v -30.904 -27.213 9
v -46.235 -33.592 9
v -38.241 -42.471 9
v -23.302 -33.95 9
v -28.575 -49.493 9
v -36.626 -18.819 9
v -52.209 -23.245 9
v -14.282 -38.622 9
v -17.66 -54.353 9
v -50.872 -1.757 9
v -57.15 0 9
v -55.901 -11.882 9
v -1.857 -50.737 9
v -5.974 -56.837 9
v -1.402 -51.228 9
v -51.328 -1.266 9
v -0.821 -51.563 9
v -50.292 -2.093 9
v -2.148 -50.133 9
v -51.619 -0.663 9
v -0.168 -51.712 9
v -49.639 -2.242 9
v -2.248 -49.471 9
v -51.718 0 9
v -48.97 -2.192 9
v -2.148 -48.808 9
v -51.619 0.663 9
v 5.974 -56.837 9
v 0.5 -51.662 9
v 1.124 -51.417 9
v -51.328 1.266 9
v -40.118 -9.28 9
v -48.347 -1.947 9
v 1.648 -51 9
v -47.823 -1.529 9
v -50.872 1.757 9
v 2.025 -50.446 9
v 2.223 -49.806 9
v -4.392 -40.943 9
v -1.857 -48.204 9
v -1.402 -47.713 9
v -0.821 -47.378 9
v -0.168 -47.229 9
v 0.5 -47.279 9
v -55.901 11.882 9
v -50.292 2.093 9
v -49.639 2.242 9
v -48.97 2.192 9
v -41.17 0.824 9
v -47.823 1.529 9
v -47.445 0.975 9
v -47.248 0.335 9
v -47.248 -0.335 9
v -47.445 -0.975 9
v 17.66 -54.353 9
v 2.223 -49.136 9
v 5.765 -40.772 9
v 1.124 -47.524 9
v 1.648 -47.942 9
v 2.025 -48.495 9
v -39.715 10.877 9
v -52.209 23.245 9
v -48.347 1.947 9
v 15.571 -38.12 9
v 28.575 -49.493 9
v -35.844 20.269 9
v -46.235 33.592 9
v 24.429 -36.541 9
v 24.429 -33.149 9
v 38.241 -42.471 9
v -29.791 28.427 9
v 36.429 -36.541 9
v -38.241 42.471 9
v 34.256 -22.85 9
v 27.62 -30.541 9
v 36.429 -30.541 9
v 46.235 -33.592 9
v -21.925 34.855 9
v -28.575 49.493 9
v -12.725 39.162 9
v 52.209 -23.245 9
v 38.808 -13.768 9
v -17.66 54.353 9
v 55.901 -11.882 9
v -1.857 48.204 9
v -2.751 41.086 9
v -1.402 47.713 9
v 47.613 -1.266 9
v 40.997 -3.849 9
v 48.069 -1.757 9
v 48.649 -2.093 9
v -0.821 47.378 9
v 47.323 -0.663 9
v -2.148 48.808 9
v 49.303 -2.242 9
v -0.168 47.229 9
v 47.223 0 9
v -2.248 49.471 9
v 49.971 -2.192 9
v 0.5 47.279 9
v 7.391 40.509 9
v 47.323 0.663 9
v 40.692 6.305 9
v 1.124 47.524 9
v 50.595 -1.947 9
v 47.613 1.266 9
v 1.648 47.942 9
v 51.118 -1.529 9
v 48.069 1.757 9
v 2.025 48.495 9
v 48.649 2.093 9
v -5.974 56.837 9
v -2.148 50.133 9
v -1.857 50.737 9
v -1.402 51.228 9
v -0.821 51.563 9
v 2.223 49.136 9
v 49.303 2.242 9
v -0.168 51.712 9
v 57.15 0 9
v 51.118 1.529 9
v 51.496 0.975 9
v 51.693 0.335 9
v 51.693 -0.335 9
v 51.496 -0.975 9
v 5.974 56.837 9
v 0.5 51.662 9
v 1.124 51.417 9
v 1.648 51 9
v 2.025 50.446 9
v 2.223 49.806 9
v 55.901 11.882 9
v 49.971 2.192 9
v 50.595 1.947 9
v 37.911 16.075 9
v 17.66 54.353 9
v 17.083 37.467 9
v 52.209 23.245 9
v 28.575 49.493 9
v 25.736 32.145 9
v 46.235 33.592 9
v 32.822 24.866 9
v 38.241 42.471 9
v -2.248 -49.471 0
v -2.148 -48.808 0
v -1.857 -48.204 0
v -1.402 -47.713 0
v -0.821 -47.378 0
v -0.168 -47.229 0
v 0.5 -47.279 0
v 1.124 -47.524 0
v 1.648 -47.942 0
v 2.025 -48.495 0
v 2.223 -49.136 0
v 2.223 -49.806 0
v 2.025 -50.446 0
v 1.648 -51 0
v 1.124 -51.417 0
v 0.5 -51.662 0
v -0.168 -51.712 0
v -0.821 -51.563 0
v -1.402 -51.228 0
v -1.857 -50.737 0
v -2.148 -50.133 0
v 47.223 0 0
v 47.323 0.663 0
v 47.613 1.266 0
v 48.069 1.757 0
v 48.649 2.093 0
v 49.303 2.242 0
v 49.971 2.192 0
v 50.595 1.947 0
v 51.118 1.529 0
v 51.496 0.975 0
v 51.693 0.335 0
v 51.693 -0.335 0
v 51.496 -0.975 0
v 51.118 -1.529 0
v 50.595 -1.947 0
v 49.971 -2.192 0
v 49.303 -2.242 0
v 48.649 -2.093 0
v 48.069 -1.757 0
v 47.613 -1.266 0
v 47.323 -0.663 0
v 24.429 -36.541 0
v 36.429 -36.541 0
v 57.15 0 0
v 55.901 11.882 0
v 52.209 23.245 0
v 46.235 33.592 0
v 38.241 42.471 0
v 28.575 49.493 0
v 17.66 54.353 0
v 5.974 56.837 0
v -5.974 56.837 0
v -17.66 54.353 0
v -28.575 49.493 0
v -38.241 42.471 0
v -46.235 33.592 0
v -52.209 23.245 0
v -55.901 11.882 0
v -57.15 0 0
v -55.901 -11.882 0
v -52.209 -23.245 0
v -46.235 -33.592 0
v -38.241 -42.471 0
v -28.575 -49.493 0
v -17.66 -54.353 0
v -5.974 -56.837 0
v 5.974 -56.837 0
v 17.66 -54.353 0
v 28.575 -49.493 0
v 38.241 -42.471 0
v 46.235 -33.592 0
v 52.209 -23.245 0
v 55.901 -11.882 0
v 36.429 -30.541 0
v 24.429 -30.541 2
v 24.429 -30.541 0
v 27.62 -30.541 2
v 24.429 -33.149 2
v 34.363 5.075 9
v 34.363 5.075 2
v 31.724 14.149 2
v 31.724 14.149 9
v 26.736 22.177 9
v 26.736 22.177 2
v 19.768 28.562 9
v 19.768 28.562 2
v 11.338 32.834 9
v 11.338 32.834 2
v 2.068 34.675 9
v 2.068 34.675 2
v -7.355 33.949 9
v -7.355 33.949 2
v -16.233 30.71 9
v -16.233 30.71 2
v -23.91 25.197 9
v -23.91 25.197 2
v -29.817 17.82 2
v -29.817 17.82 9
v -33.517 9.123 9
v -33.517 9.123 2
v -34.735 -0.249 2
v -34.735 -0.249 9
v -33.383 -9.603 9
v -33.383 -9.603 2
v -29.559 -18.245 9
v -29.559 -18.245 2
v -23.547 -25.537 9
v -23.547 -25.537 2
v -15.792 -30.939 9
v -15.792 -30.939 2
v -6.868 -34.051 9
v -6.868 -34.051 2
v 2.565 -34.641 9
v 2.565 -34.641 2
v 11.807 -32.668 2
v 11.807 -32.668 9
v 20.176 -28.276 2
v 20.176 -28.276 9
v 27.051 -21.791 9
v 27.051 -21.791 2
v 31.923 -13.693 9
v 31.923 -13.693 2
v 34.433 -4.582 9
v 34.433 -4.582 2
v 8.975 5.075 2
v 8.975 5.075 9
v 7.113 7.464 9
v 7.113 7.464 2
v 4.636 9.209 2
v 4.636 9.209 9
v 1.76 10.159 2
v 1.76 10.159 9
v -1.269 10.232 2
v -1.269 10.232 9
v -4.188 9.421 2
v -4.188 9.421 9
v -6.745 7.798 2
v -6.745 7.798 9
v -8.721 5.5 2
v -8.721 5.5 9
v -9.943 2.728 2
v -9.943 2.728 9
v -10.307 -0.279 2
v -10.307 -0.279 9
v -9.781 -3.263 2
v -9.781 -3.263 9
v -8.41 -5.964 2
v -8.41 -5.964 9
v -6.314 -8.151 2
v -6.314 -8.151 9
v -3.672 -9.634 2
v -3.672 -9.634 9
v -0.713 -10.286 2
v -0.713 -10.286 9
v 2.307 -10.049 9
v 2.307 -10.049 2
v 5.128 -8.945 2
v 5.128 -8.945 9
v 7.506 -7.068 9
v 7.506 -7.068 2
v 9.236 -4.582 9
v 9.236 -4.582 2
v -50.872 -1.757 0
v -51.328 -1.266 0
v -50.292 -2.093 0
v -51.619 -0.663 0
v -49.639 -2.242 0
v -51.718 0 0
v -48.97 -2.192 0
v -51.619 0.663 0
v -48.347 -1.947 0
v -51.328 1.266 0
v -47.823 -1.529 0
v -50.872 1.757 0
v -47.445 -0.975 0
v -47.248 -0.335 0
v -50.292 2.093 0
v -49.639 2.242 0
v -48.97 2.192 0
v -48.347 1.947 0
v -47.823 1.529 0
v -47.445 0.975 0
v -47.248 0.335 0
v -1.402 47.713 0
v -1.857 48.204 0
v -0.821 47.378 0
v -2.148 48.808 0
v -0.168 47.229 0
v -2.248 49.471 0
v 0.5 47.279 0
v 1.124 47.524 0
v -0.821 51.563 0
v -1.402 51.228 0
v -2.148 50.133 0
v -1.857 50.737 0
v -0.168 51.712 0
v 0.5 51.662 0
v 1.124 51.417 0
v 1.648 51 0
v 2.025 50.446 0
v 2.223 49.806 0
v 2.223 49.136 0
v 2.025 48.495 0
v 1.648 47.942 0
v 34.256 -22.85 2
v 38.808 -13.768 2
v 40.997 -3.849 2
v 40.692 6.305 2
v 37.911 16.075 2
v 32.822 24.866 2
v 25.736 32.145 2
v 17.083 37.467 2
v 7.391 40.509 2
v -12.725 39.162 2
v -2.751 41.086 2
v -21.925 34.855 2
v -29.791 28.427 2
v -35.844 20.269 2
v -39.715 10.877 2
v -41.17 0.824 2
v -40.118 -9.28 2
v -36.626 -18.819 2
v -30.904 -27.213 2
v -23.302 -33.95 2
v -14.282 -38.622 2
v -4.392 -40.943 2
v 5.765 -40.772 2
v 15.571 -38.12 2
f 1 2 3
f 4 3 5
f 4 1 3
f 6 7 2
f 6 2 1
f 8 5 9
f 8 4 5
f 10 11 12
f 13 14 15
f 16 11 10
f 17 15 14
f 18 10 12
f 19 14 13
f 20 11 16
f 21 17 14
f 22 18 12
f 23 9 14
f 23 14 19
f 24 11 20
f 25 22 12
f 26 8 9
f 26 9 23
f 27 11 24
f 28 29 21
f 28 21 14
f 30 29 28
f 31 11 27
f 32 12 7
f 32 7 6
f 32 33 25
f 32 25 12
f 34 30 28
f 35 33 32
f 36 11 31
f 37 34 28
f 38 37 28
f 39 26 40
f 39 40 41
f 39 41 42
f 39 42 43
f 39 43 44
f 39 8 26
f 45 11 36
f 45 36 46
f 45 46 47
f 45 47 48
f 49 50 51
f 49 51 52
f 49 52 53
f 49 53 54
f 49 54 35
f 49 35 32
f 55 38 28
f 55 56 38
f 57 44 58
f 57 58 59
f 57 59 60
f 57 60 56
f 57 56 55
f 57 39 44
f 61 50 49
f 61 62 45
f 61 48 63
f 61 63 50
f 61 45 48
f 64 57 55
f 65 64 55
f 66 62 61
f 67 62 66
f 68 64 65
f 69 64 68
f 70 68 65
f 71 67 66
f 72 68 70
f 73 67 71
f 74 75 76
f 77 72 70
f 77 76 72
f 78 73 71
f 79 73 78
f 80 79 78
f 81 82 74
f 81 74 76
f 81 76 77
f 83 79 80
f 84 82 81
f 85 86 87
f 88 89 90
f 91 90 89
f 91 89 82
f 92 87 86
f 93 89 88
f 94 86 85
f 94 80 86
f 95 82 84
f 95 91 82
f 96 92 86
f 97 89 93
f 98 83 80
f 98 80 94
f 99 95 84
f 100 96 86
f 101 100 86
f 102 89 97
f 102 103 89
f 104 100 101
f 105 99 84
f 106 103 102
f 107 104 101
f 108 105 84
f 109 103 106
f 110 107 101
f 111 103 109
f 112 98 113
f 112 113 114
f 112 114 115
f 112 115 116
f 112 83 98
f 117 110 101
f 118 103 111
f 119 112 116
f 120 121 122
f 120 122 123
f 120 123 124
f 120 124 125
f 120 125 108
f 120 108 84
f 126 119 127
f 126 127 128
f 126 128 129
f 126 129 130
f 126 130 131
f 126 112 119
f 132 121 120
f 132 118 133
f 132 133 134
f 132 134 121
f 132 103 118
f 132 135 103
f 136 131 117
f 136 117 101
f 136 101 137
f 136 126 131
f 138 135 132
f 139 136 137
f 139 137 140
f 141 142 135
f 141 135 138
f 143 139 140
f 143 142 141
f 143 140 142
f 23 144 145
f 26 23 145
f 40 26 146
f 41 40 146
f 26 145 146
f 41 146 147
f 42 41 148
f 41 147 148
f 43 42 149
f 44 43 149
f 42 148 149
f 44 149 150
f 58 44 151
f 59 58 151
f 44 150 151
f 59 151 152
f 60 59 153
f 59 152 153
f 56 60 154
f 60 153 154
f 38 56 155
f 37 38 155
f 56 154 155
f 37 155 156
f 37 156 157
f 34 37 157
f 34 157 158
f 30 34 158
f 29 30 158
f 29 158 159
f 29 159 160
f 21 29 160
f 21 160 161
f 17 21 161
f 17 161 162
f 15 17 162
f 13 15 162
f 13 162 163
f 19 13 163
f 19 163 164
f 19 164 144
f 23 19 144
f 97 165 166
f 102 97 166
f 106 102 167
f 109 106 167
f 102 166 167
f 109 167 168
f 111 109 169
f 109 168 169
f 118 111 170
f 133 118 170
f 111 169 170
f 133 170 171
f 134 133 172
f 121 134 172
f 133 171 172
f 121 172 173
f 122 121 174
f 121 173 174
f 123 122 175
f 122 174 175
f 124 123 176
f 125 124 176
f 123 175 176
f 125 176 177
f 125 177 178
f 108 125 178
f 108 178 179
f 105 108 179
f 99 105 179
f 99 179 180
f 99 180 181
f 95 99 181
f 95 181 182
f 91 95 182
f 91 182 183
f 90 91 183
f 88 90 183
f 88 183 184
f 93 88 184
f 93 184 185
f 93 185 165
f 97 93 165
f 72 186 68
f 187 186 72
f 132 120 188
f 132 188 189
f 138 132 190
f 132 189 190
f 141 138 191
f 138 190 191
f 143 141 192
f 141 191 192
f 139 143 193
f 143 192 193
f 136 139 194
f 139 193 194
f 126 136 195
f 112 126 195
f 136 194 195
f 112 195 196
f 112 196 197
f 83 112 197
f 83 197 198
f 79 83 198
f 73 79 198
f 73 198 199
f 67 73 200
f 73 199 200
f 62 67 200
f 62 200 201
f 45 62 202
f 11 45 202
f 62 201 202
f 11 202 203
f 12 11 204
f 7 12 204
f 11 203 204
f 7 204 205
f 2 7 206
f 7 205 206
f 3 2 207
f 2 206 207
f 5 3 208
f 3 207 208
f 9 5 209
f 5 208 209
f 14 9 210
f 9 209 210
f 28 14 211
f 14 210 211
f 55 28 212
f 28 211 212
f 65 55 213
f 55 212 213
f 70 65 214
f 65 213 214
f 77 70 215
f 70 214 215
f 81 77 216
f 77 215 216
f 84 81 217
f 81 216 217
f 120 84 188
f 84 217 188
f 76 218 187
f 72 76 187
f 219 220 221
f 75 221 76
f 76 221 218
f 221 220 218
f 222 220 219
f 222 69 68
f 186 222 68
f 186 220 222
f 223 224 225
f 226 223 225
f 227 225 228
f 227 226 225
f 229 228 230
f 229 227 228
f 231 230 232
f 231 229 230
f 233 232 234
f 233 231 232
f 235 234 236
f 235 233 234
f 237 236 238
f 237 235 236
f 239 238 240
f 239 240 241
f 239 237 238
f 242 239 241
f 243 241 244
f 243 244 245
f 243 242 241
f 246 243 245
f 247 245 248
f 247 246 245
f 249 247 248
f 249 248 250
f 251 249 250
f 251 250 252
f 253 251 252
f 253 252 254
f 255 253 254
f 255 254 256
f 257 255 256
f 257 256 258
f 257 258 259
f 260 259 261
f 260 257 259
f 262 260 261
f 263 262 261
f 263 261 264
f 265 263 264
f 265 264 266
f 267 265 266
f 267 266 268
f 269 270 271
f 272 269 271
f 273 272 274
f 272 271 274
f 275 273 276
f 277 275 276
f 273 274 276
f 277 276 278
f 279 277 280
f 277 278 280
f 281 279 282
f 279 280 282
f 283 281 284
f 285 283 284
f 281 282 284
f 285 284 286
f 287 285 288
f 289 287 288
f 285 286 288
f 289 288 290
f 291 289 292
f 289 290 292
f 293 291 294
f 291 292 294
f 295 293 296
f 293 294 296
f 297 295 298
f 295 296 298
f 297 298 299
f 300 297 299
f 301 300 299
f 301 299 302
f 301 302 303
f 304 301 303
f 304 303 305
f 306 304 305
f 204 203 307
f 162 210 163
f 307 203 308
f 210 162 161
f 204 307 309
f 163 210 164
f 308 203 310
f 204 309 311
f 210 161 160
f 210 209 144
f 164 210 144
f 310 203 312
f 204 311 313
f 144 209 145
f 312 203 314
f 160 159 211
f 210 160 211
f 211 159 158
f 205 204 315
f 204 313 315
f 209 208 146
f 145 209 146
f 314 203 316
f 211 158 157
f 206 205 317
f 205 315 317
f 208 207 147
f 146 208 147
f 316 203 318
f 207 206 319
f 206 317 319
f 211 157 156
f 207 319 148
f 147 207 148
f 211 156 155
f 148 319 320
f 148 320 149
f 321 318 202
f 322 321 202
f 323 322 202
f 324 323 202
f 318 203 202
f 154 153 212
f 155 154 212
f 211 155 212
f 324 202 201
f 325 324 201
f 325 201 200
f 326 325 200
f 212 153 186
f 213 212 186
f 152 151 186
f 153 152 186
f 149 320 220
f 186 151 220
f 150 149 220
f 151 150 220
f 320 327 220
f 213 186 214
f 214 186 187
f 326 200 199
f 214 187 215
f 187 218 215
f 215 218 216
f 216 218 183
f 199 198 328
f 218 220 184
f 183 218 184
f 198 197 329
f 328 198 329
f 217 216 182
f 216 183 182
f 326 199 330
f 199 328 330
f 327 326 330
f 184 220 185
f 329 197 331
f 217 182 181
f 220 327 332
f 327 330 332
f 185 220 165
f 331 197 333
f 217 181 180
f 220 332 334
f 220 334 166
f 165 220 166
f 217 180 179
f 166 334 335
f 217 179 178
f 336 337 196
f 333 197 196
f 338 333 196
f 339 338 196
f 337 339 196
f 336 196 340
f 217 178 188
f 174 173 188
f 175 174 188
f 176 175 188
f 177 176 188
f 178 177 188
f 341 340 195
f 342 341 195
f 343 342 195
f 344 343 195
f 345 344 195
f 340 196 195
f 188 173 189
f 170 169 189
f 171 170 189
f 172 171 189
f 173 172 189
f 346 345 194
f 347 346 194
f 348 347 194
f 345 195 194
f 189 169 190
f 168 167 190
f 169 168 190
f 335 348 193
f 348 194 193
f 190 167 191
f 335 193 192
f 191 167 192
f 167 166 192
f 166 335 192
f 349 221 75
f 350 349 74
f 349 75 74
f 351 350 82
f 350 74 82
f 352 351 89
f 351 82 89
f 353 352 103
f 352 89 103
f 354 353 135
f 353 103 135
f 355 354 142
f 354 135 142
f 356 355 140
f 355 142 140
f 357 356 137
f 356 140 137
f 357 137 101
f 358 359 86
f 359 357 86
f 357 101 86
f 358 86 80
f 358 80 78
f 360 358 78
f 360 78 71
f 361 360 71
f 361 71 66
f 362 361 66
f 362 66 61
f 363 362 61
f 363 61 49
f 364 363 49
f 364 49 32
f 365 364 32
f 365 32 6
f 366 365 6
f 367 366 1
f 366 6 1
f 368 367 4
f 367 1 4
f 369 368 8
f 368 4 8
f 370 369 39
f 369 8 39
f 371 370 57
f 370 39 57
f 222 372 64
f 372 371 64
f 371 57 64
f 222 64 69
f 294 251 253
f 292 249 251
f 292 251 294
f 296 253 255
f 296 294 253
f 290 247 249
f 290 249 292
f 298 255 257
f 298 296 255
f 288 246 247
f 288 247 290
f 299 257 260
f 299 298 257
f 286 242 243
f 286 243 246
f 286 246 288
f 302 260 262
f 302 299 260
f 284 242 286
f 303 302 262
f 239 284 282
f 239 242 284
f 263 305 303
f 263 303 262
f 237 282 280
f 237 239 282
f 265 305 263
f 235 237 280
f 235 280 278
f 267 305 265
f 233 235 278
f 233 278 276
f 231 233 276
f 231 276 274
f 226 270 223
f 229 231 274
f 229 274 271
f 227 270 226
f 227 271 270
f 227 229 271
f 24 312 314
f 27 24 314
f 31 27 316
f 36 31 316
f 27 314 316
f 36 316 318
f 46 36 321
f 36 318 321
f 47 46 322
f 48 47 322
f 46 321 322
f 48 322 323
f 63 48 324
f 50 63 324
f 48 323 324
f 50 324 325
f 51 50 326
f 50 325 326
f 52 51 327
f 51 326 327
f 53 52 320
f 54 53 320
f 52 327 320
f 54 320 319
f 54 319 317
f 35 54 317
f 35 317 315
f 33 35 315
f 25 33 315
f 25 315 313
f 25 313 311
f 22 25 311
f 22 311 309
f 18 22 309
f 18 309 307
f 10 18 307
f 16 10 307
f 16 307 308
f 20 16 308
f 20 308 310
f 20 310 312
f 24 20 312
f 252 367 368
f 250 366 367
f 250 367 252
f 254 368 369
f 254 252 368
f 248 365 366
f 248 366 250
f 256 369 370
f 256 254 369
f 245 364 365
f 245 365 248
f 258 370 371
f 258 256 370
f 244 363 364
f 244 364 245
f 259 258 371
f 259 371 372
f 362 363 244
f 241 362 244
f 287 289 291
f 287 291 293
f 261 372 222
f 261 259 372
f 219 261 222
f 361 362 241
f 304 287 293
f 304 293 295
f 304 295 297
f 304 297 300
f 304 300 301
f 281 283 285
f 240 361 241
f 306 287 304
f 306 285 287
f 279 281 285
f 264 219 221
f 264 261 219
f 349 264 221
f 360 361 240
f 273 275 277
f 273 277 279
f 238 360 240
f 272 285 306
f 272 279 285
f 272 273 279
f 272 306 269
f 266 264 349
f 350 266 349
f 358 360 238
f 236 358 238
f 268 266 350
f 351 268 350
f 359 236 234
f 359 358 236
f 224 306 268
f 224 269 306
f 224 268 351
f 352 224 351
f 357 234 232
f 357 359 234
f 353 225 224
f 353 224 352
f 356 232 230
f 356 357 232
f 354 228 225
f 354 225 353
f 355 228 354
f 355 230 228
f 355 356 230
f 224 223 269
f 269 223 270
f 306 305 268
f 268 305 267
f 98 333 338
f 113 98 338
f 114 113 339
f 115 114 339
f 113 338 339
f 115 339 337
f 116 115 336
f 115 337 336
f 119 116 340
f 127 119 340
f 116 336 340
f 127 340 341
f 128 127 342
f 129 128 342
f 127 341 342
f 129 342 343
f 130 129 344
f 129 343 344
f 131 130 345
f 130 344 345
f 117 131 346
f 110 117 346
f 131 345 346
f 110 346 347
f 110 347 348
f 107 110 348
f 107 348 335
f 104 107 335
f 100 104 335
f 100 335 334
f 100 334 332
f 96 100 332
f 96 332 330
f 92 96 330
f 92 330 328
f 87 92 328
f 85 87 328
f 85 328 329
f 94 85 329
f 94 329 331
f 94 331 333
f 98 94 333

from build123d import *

# Parameters (mm, degrees)
F0_R     = 57.15
F1_DEPTH = 9
F2_R     = 41.1777557501
F2_R_2   = 34.7361553424
F3_DEPTH = 7
F5_DEPTH = 7
F6_W     = 12
F6_H     = 6
F7_DEPTH = 9
F9_D     = 4.4958


with BuildPart() as f1:
    # F0 (on Top) → F1 (new body)
    with BuildSketch(Plane.XY):
        Circle(F0_R)
    extrude(amount=F1_DEPTH)

    # F2 (on face) → F3 (cut)
    with BuildSketch(Plane.XY.offset(9)):
        Circle(F2_R)
        Circle(F2_R_2, mode=Mode.SUBTRACT)
    extrude(amount=-F3_DEPTH, mode=Mode.SUBTRACT)

    # F4 (on face) → F5 (cut)
    with BuildSketch(Plane.XY.offset(9)):
        with BuildLine():
            ThreePointArc((9.2364512329, -4.5815780759), (10.0382703258, -2.3528743932), (10.3103292403, 0))
            ThreePointArc((10.3103292403, 0), (9.9709085428, 2.6237133751), (8.9749942157, 5.0746790905))
            Line((8.9749942157, 5.0746790905), (8.9749942157, -4.5815780759))
            Line((8.9749942157, -4.5815780759), (9.2364512329, -4.5815780759))
        make_face()
        with BuildLine():
            Line((37.7700850368, 5.0746790905), (34.3634707226, 5.0746790905))
            ThreePointArc((34.3634707226, 5.0746790905), (34.6428588969, 2.544172837), (34.7361553424, 0))
            ThreePointArc((34.7361553424, 0), (34.6602041198, -2.2958088649), (34.4326825895, -4.5815780759))
            Line((34.4326825895, -4.5815780759), (37.7700850368, -4.5815780759))
            Line((37.7700850368, -4.5815780759), (37.7700850368, 5.0746790905))
        make_face()
        with BuildLine():
            Line((8.9749942157, -4.5815780759), (8.9749942157, 5.0746790905))
            ThreePointArc((8.9749942157, 5.0746790905), (-10.3065518942, -0.27906468), (9.2364512329, -4.5815780759))
            Line((9.2364512329, -4.5815780759), (8.9749942157, -4.5815780759))
        make_face()
        with BuildLine():
            ThreePointArc((8.9749942157, 5.0746790905), (9.9709085428, 2.6237133751), (10.3103292403, 0))
            ThreePointArc((10.3103292403, 0), (10.0382703258, -2.3528743932), (9.2364512329, -4.5815780759))
            Line((9.2364512329, -4.5815780759), (34.4326825895, -4.5815780759))
            ThreePointArc((34.4326825895, -4.5815780759), (34.6602041198, -2.2958088649), (34.7361553424, 0))
            ThreePointArc((34.7361553424, 0), (34.6428588969, 2.544172837), (34.3634707226, 5.0746790905))
            Line((34.3634707226, 5.0746790905), (8.9749942157, 5.0746790905))
        make_face()
    extrude(amount=-F5_DEPTH, mode=Mode.SUBTRACT)

    # F6 (on face) → F7 (cut)
    with BuildSketch(Plane(origin=(0, 0, 0), x_dir=(1, 0, 0), z_dir=(0, 0, -1))):
        with Locations((30.4291332662, 33.5408807993)):
            Rectangle(F6_W, F6_H)
    extrude(amount=-F7_DEPTH, mode=Mode.SUBTRACT)

    # F9 (through all)
    with Locations(Plane.XY.offset(9)):
        with Locations((0, 49.4705886591), (-49.4705886591, 0), (0, -49.4705886591), (49.4705886591, 0)):
            Hole(F9_D / 2)


solid = f1.part
